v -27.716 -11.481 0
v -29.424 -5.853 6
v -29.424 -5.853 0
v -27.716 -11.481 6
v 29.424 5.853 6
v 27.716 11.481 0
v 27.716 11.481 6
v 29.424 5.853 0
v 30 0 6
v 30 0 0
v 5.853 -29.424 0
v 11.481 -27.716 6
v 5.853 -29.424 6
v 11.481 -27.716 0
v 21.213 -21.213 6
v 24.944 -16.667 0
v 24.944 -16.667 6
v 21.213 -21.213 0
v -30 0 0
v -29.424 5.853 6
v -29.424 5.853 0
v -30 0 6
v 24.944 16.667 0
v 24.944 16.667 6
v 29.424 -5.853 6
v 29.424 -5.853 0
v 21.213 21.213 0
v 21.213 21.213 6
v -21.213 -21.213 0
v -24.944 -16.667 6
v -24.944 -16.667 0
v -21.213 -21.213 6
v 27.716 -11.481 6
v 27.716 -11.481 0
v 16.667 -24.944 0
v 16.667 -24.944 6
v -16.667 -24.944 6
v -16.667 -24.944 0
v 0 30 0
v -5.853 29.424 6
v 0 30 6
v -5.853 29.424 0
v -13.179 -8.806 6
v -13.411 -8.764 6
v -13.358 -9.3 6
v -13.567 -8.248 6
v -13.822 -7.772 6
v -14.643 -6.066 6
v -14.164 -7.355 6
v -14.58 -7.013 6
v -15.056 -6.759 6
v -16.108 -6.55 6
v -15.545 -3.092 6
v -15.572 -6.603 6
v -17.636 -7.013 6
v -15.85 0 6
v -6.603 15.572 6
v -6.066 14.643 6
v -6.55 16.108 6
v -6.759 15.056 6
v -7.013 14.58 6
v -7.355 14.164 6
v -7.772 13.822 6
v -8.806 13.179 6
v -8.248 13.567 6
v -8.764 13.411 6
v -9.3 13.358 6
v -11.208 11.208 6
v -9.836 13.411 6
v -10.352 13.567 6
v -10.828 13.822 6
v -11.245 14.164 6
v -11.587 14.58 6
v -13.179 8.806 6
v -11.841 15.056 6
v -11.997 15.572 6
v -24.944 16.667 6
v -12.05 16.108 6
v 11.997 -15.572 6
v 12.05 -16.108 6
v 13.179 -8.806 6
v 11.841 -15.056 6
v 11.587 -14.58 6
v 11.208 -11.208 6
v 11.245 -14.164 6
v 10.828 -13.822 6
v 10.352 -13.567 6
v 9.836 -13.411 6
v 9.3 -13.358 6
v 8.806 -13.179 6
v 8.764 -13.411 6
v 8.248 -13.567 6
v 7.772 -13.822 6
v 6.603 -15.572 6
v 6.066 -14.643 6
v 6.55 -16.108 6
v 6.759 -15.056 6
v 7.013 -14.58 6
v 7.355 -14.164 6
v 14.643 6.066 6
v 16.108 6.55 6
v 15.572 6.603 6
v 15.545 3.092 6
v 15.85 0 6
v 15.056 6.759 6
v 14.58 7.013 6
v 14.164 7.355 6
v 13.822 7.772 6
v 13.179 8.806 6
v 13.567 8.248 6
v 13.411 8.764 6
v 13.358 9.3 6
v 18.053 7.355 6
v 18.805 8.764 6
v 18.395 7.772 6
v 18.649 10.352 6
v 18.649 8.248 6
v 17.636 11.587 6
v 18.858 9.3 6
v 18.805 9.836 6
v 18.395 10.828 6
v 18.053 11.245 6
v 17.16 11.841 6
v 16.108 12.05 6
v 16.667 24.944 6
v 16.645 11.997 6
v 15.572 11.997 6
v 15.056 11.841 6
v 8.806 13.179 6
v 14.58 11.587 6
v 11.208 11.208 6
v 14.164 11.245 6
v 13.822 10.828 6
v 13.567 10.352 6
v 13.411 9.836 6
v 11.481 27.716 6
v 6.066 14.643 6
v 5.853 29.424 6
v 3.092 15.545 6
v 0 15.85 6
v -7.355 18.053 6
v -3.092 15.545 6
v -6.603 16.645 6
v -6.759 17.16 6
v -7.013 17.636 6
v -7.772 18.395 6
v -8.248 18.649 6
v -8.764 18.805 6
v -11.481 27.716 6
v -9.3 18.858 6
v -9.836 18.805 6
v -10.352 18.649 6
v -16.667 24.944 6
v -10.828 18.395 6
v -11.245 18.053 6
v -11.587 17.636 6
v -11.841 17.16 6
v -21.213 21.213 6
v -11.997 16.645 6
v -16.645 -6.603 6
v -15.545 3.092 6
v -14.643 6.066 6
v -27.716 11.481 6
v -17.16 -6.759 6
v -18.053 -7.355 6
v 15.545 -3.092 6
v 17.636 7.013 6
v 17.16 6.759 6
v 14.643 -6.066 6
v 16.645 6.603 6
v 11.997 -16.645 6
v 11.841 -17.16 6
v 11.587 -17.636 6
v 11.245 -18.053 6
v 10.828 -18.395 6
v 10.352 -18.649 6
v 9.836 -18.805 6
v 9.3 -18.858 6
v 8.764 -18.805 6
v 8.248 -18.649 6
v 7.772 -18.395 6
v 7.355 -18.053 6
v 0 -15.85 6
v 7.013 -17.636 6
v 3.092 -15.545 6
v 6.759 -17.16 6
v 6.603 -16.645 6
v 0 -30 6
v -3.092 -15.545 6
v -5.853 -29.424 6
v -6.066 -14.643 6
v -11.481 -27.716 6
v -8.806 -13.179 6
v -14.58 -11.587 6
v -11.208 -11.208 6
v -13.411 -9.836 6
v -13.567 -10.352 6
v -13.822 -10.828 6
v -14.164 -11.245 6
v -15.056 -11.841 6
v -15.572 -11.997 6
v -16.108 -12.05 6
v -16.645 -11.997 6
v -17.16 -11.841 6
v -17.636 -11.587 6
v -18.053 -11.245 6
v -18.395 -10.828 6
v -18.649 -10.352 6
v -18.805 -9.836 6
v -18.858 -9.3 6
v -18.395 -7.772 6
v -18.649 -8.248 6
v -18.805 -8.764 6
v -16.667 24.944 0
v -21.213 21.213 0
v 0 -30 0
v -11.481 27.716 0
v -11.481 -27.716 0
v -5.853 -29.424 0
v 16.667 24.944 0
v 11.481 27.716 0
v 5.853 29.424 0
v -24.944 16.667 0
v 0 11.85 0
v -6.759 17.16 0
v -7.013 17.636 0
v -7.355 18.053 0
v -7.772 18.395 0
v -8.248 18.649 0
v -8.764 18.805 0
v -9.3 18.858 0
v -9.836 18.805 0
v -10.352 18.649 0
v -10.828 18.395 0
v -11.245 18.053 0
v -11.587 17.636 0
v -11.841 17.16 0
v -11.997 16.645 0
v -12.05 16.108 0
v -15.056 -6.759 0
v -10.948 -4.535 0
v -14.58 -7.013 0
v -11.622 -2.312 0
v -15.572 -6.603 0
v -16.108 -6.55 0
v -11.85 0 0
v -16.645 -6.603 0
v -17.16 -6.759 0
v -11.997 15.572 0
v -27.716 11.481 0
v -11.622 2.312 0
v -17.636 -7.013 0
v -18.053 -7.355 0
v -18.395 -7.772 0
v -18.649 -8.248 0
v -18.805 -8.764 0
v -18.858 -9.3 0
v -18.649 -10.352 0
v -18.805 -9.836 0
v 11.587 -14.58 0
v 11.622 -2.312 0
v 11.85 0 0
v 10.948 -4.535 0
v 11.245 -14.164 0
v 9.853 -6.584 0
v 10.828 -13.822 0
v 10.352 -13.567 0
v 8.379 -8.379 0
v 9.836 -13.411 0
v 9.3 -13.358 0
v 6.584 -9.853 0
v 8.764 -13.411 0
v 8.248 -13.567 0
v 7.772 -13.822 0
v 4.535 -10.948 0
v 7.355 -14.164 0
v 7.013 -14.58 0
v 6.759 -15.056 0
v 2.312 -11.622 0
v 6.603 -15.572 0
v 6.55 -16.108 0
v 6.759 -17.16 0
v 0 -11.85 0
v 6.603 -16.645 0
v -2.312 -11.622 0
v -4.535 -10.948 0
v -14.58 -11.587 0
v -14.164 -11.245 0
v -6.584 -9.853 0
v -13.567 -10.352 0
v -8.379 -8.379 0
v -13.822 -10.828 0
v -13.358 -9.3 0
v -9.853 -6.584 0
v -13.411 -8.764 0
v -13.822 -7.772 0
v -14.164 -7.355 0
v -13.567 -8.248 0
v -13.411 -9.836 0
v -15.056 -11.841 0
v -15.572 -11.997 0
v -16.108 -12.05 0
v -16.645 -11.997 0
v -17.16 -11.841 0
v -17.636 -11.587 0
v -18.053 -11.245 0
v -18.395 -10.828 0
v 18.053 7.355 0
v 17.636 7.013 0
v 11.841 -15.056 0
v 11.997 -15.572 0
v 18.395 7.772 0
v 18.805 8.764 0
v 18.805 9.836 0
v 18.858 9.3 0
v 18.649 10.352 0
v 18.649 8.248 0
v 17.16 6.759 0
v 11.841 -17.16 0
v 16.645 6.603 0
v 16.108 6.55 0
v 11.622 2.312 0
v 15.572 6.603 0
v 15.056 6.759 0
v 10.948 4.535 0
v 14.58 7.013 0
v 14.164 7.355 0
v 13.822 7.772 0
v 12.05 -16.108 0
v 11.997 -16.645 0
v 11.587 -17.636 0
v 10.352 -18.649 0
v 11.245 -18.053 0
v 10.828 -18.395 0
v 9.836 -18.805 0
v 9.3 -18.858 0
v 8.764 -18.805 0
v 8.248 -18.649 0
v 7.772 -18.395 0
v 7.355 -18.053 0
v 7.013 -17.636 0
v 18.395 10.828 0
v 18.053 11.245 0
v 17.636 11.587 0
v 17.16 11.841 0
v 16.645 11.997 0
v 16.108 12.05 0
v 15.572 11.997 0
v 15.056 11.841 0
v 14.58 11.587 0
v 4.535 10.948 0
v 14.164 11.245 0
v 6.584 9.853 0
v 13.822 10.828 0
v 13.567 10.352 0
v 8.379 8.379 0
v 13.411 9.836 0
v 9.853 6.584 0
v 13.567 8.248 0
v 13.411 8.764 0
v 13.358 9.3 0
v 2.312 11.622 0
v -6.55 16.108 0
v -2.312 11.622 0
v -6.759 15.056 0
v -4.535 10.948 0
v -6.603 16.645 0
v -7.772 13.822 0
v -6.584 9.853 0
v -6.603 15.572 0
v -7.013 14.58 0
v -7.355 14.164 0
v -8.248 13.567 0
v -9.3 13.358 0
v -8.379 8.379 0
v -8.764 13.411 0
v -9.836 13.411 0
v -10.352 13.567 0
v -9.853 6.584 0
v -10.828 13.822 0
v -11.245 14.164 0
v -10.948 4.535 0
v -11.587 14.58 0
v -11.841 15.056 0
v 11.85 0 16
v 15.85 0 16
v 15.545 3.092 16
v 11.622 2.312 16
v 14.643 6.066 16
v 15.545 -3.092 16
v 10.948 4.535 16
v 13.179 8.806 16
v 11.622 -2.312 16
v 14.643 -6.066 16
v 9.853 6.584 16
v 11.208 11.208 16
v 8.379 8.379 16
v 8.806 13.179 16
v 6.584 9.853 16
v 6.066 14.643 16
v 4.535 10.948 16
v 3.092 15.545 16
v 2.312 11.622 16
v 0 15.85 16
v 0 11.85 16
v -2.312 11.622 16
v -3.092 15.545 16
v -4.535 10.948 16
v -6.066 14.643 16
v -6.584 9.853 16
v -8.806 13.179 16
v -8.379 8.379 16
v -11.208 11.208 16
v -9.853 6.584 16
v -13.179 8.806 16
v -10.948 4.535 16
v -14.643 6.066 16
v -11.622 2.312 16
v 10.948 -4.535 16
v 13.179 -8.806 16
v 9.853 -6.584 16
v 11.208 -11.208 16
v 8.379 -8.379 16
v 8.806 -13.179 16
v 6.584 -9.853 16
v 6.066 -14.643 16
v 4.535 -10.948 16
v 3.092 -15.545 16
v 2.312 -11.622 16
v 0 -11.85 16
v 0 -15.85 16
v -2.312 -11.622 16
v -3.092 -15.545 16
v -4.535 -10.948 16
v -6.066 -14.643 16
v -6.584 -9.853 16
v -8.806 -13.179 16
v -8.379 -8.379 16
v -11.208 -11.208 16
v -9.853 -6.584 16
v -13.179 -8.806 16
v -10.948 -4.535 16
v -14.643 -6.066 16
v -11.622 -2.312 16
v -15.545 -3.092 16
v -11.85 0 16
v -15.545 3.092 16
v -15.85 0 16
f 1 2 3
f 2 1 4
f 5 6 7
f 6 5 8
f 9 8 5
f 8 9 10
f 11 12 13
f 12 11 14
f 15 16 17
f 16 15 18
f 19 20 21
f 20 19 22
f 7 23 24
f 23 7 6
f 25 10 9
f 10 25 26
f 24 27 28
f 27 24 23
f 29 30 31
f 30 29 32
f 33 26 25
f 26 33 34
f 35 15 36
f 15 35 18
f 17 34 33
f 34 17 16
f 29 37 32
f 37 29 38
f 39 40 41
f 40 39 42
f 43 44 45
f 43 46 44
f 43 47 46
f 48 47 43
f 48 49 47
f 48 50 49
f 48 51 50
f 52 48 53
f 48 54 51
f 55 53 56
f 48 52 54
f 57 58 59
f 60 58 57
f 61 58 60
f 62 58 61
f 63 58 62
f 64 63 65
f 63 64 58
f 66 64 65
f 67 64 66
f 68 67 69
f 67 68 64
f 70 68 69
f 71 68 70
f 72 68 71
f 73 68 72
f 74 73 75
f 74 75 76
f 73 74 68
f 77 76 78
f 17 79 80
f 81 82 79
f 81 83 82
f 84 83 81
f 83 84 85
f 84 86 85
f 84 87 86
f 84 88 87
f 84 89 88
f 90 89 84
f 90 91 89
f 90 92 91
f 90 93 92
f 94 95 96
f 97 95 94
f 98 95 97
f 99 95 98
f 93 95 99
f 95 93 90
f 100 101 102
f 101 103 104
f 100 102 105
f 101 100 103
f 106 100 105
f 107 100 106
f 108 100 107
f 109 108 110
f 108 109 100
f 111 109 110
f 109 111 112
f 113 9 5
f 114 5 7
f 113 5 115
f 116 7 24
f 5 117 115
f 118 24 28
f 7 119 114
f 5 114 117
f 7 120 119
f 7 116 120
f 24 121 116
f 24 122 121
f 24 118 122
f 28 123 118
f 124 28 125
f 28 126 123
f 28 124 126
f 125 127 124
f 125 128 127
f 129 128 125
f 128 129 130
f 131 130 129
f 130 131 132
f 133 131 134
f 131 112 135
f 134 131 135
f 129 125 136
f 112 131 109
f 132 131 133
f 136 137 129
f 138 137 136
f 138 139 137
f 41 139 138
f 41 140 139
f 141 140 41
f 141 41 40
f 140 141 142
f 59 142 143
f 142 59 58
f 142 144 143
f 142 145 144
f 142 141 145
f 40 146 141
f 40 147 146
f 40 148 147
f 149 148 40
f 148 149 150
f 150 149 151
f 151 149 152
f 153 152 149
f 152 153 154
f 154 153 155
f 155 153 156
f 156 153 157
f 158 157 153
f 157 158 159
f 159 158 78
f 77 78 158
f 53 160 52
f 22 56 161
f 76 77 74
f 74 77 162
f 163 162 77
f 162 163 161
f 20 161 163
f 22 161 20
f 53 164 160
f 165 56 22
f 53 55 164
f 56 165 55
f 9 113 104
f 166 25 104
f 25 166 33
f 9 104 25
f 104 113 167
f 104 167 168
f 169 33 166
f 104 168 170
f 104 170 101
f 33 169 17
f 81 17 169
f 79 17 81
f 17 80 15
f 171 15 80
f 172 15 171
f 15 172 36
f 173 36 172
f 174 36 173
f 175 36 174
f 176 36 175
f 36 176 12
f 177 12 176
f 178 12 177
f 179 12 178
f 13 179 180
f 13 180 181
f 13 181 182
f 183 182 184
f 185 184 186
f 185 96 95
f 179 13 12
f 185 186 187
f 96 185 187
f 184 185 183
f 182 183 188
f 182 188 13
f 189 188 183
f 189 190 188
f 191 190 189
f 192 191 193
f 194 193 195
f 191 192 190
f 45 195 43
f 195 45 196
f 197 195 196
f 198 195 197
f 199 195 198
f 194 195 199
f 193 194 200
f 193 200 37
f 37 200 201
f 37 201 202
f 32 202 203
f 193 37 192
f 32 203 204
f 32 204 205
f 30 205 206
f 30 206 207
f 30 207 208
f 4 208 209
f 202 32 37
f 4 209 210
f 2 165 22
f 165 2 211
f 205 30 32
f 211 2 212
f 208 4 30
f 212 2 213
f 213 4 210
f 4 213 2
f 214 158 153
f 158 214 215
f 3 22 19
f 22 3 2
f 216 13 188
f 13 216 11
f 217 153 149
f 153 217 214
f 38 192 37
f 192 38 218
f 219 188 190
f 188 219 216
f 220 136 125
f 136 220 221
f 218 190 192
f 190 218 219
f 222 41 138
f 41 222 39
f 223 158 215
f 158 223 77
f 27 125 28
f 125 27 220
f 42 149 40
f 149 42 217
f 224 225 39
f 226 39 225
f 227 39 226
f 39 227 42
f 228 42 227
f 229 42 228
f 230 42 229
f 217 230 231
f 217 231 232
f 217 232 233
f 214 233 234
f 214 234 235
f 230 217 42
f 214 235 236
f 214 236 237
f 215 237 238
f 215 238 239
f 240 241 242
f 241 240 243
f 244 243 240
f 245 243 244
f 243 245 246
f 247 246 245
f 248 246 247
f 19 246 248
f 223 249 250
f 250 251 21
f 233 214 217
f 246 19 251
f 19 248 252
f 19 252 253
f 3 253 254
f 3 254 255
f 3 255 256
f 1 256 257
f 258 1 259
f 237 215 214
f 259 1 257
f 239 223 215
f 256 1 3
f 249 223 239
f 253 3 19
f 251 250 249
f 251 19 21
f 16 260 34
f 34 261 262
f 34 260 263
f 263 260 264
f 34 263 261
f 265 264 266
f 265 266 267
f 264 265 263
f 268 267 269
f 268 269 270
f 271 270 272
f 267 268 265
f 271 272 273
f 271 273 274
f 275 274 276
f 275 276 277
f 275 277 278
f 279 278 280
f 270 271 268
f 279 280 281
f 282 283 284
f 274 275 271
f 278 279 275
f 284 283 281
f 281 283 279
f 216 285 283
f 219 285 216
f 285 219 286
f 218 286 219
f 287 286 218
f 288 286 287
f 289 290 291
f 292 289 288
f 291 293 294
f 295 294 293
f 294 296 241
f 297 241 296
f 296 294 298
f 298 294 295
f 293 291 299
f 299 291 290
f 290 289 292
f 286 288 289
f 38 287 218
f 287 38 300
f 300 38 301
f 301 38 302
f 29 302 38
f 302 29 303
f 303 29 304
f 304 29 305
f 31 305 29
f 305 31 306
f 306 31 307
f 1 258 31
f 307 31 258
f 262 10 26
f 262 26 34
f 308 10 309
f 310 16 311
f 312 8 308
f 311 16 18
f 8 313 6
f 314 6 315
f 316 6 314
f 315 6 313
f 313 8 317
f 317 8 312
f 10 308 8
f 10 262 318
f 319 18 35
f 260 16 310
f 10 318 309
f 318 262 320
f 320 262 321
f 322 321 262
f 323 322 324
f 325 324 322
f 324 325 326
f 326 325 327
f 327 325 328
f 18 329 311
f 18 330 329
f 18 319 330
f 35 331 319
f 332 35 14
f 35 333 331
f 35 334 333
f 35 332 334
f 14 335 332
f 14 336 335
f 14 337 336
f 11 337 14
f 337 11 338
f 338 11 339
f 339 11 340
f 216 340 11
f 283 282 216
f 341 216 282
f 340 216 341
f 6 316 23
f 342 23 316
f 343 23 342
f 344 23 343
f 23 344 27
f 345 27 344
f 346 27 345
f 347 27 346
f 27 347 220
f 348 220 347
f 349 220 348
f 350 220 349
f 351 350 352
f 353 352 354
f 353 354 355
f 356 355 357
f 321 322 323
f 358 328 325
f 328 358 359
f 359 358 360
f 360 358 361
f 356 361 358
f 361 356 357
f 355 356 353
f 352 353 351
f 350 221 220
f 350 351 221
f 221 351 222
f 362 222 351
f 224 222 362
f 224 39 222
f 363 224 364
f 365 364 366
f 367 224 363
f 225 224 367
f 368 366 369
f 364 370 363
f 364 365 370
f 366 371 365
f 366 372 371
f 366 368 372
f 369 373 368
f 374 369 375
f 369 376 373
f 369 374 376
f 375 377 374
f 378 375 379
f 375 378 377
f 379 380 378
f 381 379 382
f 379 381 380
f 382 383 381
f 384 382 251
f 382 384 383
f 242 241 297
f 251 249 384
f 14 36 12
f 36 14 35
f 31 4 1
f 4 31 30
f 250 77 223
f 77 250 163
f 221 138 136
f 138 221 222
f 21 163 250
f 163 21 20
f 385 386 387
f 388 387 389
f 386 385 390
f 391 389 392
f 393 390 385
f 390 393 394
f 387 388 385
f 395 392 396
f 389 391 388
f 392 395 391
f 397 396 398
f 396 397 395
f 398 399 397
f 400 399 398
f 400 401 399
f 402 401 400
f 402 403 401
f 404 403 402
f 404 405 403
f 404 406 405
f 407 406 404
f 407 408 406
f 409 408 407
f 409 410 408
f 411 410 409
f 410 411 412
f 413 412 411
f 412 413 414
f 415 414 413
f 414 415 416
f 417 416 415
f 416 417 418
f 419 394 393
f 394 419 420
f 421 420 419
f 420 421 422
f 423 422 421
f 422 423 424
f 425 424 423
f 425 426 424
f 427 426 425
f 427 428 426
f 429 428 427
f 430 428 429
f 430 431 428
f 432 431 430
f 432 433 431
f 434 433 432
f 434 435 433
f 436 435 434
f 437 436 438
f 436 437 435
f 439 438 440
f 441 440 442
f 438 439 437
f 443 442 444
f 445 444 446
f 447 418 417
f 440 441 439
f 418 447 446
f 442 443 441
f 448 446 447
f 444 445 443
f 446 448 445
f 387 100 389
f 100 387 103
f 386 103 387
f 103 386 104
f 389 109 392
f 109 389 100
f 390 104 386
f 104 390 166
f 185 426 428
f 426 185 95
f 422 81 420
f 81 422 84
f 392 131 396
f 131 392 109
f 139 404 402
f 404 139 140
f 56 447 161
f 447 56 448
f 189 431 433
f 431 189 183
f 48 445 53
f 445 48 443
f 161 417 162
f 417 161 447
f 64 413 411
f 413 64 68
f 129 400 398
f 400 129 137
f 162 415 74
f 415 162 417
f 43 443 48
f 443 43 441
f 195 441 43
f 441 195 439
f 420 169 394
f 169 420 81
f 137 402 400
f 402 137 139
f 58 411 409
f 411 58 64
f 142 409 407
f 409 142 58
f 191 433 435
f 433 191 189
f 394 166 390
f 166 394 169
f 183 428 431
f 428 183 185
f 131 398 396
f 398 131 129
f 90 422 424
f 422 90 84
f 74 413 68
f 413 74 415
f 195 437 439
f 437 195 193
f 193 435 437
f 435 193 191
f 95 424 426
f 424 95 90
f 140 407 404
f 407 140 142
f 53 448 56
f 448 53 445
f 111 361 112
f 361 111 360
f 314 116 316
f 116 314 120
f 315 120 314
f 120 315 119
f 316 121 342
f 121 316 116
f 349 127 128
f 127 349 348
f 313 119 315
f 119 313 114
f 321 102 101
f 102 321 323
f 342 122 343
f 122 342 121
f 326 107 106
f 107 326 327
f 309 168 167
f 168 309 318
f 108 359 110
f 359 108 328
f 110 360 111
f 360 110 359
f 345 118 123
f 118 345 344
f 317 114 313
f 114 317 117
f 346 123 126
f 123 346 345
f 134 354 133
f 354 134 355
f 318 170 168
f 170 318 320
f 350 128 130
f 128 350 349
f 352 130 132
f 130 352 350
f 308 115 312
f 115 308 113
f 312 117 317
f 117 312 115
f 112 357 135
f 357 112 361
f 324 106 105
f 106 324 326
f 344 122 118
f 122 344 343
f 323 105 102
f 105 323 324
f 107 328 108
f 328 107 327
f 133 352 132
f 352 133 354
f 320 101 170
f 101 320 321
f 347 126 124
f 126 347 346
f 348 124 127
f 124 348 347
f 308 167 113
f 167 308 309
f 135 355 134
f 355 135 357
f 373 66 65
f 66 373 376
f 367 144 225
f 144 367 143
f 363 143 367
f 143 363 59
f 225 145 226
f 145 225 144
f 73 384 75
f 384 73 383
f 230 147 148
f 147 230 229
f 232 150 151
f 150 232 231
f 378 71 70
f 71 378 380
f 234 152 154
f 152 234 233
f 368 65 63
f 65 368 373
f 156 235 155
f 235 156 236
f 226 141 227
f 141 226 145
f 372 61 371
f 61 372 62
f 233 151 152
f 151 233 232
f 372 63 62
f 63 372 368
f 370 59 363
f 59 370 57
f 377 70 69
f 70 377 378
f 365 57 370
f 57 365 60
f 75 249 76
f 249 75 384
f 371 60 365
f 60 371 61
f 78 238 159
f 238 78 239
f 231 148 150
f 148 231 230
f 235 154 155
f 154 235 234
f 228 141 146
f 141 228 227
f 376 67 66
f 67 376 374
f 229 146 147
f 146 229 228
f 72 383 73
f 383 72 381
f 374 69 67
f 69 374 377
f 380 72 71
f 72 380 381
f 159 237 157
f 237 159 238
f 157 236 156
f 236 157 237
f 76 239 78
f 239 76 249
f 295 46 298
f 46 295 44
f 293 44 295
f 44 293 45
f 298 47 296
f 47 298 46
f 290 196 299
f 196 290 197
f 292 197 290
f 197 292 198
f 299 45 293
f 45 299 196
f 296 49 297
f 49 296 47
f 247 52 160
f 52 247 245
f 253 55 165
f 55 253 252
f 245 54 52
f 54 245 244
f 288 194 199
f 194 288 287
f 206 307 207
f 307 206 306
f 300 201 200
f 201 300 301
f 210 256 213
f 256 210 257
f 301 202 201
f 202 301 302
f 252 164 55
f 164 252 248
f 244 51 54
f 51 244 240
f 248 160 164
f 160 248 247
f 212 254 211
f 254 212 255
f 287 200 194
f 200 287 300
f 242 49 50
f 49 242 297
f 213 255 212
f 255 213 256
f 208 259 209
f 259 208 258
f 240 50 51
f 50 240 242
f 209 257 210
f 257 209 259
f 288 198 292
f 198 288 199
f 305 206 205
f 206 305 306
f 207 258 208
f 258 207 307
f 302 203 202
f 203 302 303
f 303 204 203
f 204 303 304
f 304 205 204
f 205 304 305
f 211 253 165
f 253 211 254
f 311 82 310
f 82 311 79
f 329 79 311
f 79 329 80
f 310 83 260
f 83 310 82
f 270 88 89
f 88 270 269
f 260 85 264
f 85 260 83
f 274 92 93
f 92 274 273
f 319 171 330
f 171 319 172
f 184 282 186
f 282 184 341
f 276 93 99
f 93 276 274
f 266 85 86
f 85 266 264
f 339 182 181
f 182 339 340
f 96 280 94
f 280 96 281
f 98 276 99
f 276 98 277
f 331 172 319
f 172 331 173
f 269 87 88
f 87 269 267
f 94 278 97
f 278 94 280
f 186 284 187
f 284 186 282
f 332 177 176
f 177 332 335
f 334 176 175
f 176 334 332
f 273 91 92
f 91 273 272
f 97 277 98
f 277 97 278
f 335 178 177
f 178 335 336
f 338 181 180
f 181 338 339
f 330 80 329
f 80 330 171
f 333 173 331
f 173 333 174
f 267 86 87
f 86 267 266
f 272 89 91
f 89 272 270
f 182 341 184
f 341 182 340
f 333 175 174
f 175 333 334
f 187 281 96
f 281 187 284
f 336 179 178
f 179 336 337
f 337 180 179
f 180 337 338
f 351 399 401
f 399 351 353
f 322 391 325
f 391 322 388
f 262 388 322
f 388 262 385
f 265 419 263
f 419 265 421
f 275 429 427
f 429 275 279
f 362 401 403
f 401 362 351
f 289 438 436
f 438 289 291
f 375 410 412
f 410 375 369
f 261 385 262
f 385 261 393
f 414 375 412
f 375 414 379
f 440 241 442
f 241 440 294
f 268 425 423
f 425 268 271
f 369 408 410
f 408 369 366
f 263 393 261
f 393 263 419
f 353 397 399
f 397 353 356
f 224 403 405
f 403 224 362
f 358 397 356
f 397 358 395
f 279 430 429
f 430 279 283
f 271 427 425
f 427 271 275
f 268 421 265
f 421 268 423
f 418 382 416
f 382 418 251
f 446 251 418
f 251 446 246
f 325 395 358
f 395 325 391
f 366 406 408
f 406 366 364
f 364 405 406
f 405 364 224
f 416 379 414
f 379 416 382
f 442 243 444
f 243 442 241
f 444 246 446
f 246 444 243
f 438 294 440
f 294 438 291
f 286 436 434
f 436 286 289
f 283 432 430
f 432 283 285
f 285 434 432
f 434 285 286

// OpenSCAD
$fn = 32;

// ----------------------------------------------------------------------
// Flange Ø60 x 6
// 4 holes on a Ø37.2 bolt circle, bolted joints
// ----------------------------------------------------------------------

// --- parameters (mm) ---
flange_d = 60;   // outside diameter of the flange
thickness = 6;   // flange thickness
holes = 4;       // number of bolt holes
pcd = 37.2;      // bolt circle diameter
start_deg = 30;  // angle of the first hole, from +X
hole_d = 5.5;    // bolt hole diameter
bore_d = 23.7;   // central through bore
hub_d = 31.7;    // hub outside diameter
hub_h = 10;      // hub height above the flange face (0 = no hub)

// --- derived feature positions (mm) ---
height = thickness + hub_h;  // = 16   overall height of the part
pcd_r = pcd / 2;             // = 18.6   bolt circle radius
hole_step = 360 / holes;     // = 90   angular pitch
feature_centers = [
  [pcd_r * cos(start_deg + 0 * hole_step), pcd_r * sin(start_deg + 0 * hole_step)],
  [pcd_r * cos(start_deg + 1 * hole_step), pcd_r * sin(start_deg + 1 * hole_step)],
  [pcd_r * cos(start_deg + 2 * hole_step), pcd_r * sin(start_deg + 2 * hole_step)],
  [pcd_r * cos(start_deg + 3 * hole_step), pcd_r * sin(start_deg + 3 * hole_step)]
];   // bolt hole centres on the pitch circle

// flange disc, every hole and the bore cut straight through
difference() {
  union() {
    cylinder(d = flange_d, h = thickness);
    cylinder(d = hub_d, h = height);  // hub, overlapped into the flange
  }
  translate([0, 0, -1]) cylinder(d = bore_d, h = height + 2);  // bore, through
  for (centre = feature_centers)
    translate([centre[0], centre[1], -1]) cylinder(d = hole_d, h = thickness + 2);
}
